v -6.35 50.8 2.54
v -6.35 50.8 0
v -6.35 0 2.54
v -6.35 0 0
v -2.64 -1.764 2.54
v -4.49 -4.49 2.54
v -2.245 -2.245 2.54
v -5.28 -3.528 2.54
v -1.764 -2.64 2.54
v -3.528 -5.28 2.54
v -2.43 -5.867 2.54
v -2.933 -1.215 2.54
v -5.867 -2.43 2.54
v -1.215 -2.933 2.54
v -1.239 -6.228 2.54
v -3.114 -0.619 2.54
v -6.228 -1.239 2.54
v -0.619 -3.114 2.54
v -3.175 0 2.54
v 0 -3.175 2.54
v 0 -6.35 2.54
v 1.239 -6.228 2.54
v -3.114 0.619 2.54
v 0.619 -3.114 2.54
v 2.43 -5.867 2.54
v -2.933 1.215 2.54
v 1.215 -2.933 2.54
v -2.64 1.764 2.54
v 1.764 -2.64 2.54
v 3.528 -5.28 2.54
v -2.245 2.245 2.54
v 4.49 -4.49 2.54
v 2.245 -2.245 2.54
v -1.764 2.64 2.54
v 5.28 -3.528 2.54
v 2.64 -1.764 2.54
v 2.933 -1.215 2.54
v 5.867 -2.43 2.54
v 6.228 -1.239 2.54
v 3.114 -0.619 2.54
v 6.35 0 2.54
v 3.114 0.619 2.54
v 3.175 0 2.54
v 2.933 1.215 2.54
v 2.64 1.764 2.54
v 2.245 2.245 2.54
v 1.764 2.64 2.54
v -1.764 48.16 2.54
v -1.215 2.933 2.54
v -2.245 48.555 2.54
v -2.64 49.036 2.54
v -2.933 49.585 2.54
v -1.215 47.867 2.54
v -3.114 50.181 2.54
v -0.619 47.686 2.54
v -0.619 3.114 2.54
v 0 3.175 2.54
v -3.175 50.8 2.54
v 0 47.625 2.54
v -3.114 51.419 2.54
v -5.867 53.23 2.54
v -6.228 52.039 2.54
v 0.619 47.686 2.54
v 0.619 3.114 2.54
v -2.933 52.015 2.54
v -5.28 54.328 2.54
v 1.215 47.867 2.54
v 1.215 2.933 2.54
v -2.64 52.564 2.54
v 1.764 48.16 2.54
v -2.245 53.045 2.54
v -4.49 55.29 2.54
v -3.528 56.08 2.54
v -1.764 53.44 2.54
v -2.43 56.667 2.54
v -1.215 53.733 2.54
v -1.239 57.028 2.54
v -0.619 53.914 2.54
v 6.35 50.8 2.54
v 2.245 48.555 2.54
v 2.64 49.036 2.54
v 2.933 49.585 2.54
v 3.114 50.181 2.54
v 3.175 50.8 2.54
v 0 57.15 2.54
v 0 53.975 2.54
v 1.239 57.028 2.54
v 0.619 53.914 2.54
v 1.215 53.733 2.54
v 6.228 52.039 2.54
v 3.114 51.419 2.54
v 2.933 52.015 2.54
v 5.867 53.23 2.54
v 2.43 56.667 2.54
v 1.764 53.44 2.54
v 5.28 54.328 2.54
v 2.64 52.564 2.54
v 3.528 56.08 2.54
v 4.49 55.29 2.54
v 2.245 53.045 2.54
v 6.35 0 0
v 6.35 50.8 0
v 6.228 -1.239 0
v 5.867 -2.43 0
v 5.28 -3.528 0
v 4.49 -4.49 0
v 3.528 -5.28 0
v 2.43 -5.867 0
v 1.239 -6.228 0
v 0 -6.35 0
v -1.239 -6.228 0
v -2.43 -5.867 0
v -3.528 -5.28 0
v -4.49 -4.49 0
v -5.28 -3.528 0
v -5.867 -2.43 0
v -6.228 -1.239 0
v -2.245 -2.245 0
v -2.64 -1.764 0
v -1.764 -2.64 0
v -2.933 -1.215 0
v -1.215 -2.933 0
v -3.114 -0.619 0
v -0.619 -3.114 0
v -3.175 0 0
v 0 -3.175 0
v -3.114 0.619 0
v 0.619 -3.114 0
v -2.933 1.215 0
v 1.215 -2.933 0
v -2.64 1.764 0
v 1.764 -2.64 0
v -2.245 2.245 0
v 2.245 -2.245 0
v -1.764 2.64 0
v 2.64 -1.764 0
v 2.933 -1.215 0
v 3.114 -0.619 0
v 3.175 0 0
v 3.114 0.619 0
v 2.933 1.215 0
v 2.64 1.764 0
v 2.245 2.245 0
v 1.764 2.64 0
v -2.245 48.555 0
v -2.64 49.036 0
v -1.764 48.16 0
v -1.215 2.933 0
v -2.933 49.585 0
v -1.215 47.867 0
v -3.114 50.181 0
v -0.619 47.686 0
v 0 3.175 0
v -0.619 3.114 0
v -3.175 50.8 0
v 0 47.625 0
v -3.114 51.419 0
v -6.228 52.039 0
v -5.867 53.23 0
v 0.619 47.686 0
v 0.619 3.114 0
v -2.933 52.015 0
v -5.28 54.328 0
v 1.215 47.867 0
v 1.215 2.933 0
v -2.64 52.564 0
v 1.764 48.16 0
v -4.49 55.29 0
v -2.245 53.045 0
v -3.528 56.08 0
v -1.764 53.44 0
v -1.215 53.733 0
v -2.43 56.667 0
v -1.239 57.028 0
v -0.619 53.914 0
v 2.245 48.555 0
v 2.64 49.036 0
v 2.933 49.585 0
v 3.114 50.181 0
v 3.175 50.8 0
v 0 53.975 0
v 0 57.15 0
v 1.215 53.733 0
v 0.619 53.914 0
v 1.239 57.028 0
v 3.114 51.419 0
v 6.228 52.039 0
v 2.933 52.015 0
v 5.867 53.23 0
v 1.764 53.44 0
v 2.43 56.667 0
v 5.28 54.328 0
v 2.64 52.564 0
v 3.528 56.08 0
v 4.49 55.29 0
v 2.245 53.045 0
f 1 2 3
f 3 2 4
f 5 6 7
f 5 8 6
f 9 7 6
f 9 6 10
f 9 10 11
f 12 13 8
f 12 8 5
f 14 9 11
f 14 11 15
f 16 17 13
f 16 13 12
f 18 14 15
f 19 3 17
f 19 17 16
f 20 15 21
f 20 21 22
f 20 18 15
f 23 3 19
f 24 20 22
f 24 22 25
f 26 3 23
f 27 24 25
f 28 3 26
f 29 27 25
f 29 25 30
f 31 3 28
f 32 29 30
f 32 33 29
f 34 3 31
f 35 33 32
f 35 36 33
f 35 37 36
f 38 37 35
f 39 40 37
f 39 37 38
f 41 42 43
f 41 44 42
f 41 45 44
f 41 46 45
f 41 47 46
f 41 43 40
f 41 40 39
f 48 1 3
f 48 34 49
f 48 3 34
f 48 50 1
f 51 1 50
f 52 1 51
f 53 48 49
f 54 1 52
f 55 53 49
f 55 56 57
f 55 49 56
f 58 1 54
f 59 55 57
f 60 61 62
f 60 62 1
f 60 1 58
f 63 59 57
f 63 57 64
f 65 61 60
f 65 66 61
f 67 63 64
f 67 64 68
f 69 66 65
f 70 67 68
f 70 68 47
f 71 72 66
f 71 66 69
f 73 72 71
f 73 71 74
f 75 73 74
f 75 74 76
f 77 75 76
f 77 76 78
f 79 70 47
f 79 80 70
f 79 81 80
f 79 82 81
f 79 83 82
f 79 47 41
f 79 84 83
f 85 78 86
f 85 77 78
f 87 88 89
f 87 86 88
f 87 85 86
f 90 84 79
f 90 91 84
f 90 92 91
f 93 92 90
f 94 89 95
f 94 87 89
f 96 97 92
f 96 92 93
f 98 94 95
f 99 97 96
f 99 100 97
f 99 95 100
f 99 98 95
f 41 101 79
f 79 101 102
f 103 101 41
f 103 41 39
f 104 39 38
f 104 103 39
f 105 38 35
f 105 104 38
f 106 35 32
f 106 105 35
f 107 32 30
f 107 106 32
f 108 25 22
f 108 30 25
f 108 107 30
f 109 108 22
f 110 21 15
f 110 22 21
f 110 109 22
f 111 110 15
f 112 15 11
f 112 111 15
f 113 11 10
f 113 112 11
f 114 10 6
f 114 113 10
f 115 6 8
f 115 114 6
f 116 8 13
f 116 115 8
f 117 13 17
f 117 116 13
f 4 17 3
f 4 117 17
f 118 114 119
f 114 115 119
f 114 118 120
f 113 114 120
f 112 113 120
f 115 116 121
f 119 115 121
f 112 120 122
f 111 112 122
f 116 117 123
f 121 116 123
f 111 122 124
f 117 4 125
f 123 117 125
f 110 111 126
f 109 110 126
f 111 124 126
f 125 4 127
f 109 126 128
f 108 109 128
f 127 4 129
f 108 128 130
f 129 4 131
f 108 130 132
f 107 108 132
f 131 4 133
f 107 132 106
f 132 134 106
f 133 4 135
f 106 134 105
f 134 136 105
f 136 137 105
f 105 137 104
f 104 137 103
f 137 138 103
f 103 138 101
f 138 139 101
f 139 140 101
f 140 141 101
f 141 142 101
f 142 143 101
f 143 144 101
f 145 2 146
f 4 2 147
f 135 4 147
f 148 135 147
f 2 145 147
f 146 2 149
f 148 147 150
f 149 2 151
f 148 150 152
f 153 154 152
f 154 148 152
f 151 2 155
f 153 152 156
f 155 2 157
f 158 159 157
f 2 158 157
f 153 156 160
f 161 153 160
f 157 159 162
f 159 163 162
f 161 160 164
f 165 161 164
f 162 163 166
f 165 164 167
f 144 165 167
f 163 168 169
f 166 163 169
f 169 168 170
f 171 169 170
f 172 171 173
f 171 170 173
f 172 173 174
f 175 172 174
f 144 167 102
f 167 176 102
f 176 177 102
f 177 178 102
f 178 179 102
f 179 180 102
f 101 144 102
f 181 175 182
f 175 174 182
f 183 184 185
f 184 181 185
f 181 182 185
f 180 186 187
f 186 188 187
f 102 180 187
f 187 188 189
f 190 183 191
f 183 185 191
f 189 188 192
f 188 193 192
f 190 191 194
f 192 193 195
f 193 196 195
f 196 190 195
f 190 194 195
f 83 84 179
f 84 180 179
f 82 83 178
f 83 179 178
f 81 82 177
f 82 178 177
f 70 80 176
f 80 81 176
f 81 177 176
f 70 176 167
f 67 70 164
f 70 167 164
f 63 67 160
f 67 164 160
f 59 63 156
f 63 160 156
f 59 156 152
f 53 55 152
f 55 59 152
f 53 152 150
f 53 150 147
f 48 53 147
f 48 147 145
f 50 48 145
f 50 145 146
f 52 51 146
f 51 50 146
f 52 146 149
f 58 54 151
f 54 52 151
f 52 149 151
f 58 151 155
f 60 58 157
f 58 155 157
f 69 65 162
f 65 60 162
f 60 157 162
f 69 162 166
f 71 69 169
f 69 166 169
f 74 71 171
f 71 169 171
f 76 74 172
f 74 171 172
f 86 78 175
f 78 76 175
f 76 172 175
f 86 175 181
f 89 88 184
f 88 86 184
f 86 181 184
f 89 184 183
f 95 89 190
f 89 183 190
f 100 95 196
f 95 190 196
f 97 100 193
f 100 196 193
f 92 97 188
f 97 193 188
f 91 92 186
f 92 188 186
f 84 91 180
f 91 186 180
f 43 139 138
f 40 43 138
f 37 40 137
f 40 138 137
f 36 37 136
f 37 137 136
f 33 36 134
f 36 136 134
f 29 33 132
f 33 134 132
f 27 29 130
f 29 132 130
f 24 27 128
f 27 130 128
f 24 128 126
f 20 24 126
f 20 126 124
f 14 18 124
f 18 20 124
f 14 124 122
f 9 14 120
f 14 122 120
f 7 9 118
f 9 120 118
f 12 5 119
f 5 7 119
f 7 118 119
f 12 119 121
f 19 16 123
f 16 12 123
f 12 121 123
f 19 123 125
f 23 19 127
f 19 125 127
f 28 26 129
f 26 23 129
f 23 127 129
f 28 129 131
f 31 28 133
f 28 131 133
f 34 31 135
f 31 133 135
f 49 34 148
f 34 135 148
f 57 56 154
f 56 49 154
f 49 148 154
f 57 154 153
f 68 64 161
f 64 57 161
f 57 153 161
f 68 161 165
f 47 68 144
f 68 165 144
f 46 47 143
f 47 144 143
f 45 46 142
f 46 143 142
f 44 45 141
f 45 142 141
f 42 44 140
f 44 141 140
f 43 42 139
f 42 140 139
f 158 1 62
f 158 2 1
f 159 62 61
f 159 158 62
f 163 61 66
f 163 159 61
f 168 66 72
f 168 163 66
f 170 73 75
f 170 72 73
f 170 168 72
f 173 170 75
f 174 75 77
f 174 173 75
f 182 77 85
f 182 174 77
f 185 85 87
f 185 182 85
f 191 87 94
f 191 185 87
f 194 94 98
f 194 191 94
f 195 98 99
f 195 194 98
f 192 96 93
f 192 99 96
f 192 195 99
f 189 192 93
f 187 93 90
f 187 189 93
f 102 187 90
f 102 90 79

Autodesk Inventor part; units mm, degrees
ref_plane "YZ Plane" through (0, 0, 0) normal (1, 0, 0) x (0, 1, 0)
ref_plane "XZ Plane" through (0, 0, 0) normal (0, 1, 0) x (-1, 0, 0)
ref_plane "XY Plane" through (0, 0, 0) normal (0, 0, 1) x (1, 0, 0)
sketch "Sketch1" plane through (0, 0, 0) normal (0, 0, 1) x (1, 0, 0)
  circle A0 centre (0, 0) radius 6.35
  circle A1 centre (0, 0) radius 3.175
  line L0 (0, 0) -> (0, 50.8)
  circle A2 centre (0, 50.8) radius 6.35
  circle A3 centre (0, 50.8) radius 3.175
  line L1 (-6.35, 50.8) -> (-6.35, 0)
  line L2 (6.35, 0) -> (6.35, 50.8)
  dimension "d1" = 12.7
  dimension "d2" = 6.35
  dimension "d4" = 50.8
extrude "Extrusion1" add sketch "Sketch1" along normal blind 2.54
properties part number "arm"
